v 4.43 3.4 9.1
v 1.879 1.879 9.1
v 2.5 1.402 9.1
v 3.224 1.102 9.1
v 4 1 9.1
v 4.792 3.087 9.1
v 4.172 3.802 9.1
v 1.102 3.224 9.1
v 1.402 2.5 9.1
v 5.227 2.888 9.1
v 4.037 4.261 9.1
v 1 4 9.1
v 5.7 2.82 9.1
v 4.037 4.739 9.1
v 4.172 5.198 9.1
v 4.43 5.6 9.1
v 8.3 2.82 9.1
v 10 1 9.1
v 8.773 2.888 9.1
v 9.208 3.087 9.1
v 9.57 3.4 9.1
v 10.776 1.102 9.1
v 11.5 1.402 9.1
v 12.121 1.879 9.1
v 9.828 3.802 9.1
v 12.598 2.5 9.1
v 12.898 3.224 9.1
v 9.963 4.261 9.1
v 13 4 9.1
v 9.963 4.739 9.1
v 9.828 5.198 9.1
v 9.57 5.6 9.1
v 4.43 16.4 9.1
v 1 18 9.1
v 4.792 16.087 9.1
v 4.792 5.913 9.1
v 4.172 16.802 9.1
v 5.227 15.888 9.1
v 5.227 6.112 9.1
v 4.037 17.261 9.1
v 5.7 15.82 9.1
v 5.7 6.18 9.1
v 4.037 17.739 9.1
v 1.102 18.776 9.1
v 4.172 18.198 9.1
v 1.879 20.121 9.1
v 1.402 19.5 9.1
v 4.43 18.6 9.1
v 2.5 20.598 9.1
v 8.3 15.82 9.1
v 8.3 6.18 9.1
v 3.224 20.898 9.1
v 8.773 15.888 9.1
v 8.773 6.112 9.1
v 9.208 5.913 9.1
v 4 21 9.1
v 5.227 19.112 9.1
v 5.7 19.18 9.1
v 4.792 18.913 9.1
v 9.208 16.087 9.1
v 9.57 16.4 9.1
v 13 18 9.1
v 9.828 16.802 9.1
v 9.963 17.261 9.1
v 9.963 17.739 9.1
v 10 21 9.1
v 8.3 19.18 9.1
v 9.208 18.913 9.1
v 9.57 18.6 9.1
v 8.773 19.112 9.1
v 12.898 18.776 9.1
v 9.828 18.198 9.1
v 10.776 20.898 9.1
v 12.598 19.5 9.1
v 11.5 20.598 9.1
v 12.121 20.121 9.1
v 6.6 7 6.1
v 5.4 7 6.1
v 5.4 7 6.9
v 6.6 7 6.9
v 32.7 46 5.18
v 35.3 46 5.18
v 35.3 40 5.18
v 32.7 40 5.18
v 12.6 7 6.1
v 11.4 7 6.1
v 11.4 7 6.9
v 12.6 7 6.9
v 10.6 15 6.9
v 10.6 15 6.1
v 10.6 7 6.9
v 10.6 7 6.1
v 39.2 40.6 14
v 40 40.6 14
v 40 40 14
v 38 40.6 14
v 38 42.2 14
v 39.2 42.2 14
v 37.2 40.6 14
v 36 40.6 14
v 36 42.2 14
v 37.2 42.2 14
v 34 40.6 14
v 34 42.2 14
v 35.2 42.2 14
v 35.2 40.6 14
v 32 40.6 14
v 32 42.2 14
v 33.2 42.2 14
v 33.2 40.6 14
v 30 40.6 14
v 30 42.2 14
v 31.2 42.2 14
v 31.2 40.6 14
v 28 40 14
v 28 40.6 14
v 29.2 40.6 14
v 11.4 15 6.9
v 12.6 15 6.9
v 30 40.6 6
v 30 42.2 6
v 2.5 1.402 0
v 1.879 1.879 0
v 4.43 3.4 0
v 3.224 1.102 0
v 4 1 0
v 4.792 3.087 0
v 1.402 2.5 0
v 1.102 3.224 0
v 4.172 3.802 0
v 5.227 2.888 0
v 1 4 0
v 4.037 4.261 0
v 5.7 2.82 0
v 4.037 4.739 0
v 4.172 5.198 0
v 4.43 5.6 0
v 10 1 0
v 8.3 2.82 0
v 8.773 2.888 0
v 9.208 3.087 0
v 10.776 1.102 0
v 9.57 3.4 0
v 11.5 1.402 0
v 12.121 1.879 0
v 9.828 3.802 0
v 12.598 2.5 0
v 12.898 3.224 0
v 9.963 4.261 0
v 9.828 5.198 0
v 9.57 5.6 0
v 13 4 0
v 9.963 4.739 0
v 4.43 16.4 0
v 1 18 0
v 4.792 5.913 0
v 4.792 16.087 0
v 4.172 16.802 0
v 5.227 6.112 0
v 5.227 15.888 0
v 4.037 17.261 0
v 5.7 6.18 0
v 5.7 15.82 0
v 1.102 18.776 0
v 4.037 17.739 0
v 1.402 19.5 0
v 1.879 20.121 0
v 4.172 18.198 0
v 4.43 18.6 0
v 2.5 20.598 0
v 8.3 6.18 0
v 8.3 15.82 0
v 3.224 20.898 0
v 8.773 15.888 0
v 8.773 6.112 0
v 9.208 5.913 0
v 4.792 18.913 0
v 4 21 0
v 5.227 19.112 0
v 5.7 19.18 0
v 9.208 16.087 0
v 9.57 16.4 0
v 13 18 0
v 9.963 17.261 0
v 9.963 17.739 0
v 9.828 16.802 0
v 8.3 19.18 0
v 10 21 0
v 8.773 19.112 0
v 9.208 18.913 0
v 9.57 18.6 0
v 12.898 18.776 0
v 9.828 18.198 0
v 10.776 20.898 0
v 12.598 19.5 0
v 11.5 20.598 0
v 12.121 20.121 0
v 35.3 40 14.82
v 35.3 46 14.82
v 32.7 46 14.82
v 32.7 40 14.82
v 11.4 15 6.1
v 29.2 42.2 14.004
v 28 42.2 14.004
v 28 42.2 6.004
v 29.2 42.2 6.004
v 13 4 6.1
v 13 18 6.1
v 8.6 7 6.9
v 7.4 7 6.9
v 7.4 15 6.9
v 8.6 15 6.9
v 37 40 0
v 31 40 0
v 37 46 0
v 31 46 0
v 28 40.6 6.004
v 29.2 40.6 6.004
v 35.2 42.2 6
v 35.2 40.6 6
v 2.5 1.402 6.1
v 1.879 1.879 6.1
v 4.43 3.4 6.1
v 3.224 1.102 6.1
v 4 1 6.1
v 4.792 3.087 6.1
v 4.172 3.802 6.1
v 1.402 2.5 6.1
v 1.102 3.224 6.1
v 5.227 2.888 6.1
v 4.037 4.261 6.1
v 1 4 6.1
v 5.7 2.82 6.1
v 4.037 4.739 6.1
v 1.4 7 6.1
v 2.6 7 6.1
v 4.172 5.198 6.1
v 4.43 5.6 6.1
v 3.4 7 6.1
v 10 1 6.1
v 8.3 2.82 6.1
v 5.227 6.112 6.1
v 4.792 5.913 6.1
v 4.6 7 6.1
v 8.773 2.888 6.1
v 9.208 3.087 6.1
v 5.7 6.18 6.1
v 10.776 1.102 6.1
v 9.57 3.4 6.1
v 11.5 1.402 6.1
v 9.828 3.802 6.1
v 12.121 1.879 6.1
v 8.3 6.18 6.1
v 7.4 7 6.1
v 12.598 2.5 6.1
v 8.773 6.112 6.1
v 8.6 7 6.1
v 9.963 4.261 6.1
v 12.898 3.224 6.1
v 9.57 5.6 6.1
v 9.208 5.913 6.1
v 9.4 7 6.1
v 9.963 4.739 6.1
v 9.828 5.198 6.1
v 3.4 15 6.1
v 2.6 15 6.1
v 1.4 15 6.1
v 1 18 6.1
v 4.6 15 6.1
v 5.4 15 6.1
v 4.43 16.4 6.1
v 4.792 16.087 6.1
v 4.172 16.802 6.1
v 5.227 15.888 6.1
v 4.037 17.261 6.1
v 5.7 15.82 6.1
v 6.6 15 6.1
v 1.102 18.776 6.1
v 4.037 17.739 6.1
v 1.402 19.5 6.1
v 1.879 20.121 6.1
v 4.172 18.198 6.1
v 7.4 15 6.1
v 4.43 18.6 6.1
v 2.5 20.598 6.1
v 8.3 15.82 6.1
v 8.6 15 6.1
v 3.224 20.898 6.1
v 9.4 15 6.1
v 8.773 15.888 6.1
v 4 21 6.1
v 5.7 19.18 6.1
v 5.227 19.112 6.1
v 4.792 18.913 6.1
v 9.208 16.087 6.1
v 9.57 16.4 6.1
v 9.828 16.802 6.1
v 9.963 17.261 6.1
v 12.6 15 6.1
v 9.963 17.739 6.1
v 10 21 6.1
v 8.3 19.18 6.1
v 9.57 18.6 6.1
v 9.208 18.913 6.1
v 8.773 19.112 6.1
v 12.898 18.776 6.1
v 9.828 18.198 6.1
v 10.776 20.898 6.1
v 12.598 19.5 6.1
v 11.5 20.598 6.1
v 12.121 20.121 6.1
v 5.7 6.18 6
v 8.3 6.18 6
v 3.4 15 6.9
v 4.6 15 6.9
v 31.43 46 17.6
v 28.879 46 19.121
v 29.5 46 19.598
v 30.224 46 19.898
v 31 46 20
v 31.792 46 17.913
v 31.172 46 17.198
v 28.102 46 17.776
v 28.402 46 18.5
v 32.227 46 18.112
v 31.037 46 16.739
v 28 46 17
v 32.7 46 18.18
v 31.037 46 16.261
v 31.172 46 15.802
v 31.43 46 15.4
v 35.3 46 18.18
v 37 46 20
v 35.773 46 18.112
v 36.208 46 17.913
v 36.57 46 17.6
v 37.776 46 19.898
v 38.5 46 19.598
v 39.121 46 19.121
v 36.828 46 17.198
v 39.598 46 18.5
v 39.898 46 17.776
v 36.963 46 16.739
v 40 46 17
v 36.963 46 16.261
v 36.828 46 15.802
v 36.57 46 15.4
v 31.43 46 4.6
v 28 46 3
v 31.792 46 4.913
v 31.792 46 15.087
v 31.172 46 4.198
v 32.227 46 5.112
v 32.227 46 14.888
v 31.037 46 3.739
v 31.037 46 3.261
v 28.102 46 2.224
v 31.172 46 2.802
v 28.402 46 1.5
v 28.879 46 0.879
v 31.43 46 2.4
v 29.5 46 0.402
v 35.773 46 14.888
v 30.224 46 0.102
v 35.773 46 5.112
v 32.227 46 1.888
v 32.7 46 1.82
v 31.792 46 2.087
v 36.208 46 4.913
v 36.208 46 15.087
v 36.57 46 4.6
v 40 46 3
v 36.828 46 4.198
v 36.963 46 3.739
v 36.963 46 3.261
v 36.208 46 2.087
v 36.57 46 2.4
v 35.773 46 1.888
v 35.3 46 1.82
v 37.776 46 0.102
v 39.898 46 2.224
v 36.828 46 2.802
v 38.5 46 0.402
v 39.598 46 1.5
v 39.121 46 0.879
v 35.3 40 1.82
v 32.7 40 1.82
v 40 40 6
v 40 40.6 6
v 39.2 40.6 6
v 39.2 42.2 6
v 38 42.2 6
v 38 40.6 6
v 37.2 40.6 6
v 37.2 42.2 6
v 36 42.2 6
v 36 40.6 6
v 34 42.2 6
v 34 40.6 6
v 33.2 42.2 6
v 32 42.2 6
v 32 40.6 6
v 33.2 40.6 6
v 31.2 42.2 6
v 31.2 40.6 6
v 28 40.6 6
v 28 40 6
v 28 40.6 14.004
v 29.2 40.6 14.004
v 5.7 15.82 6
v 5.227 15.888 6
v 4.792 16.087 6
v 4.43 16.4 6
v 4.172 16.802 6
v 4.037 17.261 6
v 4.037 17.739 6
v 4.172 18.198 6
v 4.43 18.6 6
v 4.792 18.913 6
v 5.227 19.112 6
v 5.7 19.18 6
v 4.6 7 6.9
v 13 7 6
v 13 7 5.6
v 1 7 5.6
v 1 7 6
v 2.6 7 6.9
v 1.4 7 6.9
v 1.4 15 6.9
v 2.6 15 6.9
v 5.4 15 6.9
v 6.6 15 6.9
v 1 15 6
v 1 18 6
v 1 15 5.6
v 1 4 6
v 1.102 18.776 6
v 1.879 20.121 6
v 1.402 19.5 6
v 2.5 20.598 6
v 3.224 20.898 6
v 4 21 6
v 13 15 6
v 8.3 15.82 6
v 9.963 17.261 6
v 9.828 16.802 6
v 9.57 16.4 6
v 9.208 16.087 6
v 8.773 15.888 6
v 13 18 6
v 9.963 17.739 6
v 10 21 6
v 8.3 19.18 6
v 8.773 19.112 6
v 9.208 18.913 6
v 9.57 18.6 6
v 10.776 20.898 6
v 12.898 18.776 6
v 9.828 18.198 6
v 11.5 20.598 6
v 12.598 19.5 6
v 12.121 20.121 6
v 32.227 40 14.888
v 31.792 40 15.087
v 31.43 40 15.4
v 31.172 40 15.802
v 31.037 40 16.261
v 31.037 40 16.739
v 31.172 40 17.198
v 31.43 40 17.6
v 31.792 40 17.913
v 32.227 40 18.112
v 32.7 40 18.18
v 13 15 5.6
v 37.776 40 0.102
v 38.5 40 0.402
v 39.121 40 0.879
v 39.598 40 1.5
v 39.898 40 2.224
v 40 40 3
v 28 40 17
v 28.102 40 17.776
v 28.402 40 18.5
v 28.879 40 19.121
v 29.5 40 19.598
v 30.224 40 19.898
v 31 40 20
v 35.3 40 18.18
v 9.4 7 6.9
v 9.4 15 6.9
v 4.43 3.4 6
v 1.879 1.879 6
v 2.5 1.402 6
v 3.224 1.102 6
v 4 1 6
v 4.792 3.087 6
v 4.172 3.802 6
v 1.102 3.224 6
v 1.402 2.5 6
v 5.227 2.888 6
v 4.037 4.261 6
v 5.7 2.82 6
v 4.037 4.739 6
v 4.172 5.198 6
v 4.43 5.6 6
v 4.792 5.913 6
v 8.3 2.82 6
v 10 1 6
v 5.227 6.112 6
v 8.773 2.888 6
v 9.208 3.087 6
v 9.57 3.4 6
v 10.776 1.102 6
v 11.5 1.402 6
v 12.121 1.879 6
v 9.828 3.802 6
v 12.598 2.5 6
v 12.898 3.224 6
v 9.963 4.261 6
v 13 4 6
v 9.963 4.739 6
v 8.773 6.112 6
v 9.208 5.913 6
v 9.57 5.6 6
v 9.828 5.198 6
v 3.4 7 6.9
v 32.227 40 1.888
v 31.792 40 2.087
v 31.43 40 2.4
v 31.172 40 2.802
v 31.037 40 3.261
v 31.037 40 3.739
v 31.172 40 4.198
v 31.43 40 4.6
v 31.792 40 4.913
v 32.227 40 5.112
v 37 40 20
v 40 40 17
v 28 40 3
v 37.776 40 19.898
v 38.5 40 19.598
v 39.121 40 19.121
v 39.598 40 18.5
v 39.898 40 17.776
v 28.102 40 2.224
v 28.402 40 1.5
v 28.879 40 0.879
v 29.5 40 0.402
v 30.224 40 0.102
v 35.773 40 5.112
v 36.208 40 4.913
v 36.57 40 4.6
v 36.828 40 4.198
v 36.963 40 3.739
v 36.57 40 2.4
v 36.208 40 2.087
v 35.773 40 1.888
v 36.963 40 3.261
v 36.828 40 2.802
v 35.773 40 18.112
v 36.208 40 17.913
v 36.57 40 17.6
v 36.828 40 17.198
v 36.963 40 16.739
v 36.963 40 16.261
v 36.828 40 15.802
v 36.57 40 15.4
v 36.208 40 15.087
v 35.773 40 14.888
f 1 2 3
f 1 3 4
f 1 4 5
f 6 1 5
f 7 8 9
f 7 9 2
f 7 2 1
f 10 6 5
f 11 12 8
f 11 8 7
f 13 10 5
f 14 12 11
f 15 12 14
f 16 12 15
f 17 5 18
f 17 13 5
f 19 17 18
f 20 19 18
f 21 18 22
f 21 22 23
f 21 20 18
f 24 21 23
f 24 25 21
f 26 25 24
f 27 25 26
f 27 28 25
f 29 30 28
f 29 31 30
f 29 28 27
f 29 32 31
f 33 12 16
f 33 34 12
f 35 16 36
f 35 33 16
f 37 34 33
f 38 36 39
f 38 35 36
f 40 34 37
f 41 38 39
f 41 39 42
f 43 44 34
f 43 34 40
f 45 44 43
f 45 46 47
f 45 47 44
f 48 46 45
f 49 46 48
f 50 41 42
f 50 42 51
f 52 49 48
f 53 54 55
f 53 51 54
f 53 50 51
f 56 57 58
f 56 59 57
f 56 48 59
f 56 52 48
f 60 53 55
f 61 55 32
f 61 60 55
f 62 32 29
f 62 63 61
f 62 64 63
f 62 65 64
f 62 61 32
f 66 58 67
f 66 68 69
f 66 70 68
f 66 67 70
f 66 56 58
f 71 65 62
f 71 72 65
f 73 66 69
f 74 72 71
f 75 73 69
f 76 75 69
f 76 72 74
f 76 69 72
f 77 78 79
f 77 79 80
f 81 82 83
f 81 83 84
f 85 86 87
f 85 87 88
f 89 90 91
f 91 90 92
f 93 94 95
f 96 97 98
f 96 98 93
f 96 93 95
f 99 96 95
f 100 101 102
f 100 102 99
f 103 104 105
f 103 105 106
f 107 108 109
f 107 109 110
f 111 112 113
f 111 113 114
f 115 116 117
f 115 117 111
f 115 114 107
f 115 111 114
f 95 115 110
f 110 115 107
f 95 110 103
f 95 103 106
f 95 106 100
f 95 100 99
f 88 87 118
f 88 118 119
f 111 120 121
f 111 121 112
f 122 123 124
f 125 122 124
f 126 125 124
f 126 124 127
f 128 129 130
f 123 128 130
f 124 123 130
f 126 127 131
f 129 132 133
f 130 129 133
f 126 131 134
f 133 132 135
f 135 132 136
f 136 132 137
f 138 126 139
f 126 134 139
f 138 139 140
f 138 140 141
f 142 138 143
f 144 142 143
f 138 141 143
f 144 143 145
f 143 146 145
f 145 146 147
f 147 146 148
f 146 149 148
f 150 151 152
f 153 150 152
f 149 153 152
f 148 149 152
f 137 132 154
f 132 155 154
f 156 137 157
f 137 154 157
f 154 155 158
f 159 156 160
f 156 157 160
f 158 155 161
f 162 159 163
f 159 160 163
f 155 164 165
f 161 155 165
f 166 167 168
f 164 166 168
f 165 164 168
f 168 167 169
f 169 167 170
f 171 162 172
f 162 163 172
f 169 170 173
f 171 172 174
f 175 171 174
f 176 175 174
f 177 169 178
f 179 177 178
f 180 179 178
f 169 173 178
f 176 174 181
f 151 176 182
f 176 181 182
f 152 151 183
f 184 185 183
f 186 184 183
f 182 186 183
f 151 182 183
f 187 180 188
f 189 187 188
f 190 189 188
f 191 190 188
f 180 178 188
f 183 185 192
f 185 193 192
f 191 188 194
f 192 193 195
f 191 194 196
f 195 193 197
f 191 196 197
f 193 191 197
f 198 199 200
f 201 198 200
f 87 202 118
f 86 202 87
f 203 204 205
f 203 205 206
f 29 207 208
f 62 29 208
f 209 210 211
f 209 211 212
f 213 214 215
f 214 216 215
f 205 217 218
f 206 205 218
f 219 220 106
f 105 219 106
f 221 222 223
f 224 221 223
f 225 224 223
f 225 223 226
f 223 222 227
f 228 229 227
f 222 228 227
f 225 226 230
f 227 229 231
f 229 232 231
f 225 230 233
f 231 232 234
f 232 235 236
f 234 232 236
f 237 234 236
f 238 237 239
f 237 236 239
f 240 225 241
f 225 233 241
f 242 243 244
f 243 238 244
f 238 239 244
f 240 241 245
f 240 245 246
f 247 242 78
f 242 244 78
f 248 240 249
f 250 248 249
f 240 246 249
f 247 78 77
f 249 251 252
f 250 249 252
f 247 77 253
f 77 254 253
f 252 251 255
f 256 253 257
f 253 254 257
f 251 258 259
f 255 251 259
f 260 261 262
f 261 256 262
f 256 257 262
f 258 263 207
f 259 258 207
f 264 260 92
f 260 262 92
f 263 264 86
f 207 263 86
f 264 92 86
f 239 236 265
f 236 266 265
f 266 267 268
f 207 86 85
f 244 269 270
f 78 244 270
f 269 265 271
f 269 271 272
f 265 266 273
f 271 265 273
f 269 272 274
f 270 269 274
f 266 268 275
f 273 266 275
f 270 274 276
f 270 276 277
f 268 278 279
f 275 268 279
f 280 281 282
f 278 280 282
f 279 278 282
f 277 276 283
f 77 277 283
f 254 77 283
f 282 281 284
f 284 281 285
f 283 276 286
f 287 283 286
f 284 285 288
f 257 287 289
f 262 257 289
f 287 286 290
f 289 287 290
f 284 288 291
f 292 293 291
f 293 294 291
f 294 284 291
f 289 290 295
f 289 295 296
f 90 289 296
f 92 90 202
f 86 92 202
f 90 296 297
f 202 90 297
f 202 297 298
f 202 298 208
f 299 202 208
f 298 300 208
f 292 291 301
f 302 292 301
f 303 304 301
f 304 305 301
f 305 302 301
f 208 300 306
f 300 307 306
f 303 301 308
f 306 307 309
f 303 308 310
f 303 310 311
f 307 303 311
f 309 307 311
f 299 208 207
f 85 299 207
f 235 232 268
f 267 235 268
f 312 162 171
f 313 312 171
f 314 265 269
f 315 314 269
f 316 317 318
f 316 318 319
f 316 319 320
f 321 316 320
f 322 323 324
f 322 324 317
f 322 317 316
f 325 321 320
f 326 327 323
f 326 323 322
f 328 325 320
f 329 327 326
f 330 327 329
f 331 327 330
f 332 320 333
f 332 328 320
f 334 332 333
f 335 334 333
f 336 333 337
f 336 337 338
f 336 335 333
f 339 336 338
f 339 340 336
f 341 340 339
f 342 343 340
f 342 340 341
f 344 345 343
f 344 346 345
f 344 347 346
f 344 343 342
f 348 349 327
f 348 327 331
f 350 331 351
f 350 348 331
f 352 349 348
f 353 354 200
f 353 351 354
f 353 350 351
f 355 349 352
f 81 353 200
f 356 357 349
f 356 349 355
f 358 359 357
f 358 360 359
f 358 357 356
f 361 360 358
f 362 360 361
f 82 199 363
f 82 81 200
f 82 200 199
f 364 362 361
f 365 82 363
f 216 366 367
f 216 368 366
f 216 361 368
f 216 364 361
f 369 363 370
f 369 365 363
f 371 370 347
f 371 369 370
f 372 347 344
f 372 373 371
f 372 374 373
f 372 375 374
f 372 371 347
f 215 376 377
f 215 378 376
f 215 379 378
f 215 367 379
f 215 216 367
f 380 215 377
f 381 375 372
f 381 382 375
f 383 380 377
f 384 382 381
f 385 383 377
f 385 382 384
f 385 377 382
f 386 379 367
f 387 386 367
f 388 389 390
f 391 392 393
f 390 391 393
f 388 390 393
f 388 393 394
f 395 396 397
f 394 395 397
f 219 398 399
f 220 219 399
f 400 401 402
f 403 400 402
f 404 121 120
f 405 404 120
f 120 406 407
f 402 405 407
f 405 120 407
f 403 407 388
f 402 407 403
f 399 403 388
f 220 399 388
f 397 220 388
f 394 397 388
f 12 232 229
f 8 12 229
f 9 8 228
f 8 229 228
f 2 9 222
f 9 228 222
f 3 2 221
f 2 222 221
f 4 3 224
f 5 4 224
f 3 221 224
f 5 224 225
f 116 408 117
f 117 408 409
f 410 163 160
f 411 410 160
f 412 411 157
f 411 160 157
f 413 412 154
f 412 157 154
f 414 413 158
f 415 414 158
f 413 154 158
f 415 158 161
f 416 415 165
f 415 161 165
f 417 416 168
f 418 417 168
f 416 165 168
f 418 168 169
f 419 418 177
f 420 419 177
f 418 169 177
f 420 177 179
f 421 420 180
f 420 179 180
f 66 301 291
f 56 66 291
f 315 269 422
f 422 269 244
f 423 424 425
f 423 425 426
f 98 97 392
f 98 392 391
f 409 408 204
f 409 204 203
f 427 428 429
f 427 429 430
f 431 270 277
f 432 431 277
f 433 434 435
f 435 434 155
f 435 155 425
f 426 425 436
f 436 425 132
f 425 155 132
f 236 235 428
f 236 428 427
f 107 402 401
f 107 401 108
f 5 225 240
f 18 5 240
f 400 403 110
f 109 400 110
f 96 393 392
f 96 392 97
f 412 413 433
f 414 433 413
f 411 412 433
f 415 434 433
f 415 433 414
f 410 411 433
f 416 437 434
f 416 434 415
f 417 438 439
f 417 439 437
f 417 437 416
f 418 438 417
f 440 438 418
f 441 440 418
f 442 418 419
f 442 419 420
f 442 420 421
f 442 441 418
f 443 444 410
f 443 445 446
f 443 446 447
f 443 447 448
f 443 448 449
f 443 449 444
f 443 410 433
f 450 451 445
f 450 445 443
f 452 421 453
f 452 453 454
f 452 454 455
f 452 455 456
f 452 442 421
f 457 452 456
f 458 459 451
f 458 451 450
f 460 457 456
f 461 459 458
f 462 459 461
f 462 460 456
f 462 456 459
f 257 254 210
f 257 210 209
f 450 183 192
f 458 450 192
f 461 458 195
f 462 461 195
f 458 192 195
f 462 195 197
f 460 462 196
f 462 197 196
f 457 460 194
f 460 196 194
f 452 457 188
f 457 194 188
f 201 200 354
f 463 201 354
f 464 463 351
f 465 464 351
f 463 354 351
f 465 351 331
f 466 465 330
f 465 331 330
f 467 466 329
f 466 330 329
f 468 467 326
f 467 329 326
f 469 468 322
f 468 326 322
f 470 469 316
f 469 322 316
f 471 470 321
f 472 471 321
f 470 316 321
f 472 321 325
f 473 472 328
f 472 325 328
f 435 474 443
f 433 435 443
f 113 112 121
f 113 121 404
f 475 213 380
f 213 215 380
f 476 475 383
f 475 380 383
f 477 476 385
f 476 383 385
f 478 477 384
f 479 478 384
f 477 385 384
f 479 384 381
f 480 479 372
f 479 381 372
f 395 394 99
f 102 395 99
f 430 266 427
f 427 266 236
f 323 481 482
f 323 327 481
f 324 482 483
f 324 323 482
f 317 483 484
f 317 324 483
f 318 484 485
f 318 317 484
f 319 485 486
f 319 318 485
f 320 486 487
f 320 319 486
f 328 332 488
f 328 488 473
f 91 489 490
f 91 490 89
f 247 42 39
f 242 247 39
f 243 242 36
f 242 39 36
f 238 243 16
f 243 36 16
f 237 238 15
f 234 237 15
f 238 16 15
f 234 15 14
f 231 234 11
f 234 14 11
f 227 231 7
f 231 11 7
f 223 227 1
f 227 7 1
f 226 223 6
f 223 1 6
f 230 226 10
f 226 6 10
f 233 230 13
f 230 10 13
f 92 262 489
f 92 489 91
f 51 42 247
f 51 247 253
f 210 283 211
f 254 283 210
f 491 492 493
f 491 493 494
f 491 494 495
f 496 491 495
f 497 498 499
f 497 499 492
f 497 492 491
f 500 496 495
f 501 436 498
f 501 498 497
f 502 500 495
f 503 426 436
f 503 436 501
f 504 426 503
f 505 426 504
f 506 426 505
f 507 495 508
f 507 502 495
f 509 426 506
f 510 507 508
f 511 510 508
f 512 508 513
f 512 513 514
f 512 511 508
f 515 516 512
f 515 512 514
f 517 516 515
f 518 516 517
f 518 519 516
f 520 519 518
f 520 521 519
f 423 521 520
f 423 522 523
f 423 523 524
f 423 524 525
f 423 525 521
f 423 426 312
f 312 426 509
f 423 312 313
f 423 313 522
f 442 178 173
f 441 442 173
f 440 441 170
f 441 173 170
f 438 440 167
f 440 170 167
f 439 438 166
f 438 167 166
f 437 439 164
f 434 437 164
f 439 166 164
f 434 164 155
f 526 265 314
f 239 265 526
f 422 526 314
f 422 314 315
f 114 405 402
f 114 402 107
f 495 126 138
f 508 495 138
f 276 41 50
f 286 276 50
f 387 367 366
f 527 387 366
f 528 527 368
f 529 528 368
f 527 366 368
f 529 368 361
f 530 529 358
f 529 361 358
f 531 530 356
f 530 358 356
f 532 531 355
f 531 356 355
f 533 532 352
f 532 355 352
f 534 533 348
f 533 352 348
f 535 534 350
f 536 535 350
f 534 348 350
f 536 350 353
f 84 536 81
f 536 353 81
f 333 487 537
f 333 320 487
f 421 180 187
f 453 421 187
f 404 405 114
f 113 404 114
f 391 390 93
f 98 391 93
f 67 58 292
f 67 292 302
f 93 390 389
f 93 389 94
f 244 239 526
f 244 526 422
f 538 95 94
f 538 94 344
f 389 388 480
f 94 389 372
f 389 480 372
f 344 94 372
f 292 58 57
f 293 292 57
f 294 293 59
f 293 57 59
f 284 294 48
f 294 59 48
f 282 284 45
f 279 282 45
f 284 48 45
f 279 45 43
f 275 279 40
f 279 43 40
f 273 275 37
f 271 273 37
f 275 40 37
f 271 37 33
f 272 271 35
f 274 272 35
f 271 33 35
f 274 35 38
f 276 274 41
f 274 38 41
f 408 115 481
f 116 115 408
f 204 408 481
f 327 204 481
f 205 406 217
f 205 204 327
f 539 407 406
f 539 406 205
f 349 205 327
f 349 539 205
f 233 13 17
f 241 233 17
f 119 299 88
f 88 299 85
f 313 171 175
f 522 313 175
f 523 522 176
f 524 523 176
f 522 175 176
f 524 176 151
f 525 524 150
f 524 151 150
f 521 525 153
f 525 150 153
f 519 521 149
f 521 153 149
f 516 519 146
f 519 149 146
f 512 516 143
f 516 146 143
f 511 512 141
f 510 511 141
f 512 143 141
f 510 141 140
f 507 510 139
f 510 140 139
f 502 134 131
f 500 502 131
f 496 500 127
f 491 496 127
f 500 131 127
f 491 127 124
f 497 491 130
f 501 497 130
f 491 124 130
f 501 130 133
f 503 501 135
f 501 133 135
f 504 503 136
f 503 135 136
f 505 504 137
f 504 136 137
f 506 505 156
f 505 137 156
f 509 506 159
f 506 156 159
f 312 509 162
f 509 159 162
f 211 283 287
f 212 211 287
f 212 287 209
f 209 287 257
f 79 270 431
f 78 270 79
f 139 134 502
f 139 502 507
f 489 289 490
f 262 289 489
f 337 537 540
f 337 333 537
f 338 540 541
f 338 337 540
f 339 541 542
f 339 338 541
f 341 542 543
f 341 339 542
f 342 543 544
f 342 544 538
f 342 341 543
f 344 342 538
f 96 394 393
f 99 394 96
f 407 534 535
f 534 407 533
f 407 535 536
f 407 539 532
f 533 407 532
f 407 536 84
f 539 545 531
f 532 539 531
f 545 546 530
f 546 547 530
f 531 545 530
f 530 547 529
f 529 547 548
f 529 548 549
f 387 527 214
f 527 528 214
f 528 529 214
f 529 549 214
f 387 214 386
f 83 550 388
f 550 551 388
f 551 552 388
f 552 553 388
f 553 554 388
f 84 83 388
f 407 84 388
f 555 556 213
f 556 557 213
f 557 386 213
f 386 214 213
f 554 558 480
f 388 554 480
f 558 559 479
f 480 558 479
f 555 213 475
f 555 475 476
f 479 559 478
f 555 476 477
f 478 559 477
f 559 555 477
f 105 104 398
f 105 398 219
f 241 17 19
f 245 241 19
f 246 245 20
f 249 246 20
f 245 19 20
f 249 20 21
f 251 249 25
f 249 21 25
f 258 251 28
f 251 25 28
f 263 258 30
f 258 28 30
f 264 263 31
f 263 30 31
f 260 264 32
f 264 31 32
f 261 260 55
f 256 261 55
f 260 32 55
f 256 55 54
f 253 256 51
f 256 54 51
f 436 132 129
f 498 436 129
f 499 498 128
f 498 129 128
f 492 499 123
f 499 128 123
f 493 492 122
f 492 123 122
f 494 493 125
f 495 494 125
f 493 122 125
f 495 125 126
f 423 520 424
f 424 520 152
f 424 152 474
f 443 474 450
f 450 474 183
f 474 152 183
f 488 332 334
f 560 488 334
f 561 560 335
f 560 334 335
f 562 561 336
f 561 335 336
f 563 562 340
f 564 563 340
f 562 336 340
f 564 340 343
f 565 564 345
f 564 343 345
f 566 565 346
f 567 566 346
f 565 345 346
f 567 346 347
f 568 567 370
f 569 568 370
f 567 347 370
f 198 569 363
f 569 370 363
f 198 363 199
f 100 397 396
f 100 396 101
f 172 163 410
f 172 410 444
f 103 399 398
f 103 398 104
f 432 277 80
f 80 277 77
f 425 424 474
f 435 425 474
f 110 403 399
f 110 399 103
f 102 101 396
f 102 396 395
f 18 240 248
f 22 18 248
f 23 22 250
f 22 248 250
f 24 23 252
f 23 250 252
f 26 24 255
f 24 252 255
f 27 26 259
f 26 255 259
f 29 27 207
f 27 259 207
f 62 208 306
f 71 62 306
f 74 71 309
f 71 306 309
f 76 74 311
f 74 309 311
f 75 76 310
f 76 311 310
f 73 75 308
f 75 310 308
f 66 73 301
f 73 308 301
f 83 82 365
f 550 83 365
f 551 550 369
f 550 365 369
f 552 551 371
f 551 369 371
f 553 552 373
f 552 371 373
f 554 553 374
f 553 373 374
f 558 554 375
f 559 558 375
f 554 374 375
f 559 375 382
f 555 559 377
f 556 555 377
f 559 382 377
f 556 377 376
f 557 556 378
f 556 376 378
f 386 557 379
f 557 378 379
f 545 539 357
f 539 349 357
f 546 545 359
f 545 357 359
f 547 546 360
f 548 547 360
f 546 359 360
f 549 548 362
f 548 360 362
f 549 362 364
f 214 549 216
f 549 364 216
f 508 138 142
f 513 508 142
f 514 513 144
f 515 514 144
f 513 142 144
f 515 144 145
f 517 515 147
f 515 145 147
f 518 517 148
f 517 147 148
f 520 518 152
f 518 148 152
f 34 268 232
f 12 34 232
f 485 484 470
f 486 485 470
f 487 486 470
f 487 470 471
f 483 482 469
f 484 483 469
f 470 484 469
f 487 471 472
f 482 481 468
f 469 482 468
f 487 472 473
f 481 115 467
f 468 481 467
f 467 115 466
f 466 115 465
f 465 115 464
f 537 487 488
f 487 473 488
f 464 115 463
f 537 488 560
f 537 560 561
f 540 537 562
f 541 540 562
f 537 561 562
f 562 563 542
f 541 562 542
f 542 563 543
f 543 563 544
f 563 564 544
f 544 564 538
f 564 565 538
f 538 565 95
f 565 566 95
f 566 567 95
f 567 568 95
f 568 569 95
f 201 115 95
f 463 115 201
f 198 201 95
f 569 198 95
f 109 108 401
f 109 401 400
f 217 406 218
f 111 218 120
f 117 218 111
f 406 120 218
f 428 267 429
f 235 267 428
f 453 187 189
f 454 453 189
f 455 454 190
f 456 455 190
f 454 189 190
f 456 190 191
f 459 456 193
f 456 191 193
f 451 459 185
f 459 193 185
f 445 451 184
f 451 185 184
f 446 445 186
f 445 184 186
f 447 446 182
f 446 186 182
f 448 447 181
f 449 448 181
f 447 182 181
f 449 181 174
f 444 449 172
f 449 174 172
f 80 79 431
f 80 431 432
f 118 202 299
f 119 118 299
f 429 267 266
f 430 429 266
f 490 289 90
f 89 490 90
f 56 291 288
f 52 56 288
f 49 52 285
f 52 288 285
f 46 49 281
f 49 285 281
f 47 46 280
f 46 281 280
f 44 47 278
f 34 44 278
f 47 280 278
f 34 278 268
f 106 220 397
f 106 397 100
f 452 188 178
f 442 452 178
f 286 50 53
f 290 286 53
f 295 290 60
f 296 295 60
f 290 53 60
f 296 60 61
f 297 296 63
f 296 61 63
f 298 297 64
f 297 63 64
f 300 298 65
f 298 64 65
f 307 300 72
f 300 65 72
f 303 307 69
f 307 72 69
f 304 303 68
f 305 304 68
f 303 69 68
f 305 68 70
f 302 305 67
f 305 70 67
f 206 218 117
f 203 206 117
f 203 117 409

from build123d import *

# Parameters (mm, degrees)
BOX002_W        = 12
BOX002_H        = 6
BOX002_DEPTH    = 20
POCKET015_DEPTH = 6.001
SKETCH013_W     = 0.6
SKETCH013_H     = 8
POCKET016_DEPTH = 12.001
SKETCH011_W     = 1.2
SKETCH011_H     = 8
POCKET017_DEPTH = 1.6
FILLET006_R     = 3
PAD_DEPTH       = 6
SKETCH015_W     = 8
SKETCH015_H     = 0.5
POCKET_DEPTH    = 12.001
POCKET018_DEPTH = 6.001
PAD001_DEPTH    = 3
POCKET019_DEPTH = 5
SKETCH017_W     = 1.2
SKETCH017_H     = 8
POCKET020_DEPTH = 0.8


with BuildPart() as fillet006:
    # Box002 → Box002 (new body)
    with BuildSketch(Plane(origin=(28, 40, 0), x_dir=(1, 0, 0), z_dir=(0, 0, 1))):
        with Locations((6, 3)):
            Rectangle(BOX002_W, BOX002_H)
    extrude(amount=BOX002_DEPTH)

    # Sketch012 → Pocket015 (cut, through all)
    with BuildSketch(Plane(origin=(28, 46, 0), x_dir=(-1, 0, 0), z_dir=(0, 1, 0))):
        with BuildLine():
            ThreePointArc((-7.3, 18.18), (-8.98, 16.5), (-7.3, 14.82))
            Line((-7.3, 14.82), (-4.7, 14.82))
            ThreePointArc((-4.7, 14.82), (-3.02, 16.5), (-4.7, 18.18))
            Line((-7.3, 18.18), (-4.7, 18.18))
        make_face()
        with BuildLine():
            ThreePointArc((-7.3, 5.18), (-8.98, 3.5), (-7.3, 1.82))
            Line((-7.3, 1.82), (-4.7, 1.82))
            ThreePointArc((-4.7, 1.82), (-3.02, 3.5), (-4.7, 5.18))
            Line((-7.3, 5.18), (-4.7, 5.18))
        make_face()
    extrude(amount=-POCKET015_DEPTH, mode=Mode.SUBTRACT)

    # Sketch013 → Pocket016 (cut, through all)
    with BuildSketch(Plane(origin=(28, 40, 0), x_dir=(0, -1, 0), z_dir=(-1, 0, 0))):
        with Locations((-0.3, 10)):
            Rectangle(SKETCH013_W, SKETCH013_H)
    extrude(amount=-POCKET016_DEPTH, mode=Mode.SUBTRACT)

    # Sketch011 → Pocket017 (cut)
    with BuildSketch(Plane(origin=(28, 40.6, 0), x_dir=(1, 0, 0), z_dir=(0, -1, 0))):
        with Locations((6.599989, 10)):
            Rectangle(SKETCH011_W, SKETCH011_H)
        with Locations((4.599989, 10)):
            Rectangle(SKETCH011_W, SKETCH011_H)
        with Locations((2.599989, 10)):
            Rectangle(SKETCH011_W, SKETCH011_H)
        with Locations((0.6, 10.00427)):
            Rectangle(SKETCH011_W, SKETCH011_H)
        with Locations((8.599989, 10)):
            Rectangle(SKETCH011_W, SKETCH011_H)
        with Locations((10.599989, 10)):
            Rectangle(SKETCH011_W, SKETCH011_H)
    extrude(amount=-POCKET017_DEPTH, mode=Mode.SUBTRACT)

    # Fillet006
    fillet006_edges = [fillet006.edges().sort_by_distance(p)[0] for p in [
        (28, 43, 20),
        (28, 43, 0),
        (40, 43, 20),
        (40, 43, 0),
    ]]
    fillet(fillet006_edges, radius=FILLET006_R)


with BuildPart() as pocket018:
    # Sketch → Pad (new body)
    with BuildSketch(Plane.XY):
        with BuildLine():
            Line((4, 1), (10, 1))
            ThreePointArc((10, 1), (12.12132, 1.87868), (13, 4))
            Line((13, 4), (13, 18))
            ThreePointArc((13, 18), (12.12132, 20.12132), (10, 21))
            Line((10, 21), (4, 21))
            ThreePointArc((4, 21), (1.87868, 20.12132), (1, 18))
            Line((1, 18), (1, 4))
            ThreePointArc((1, 4), (1.87868, 1.87868), (4, 1))
        make_face()
    extrude(amount=PAD_DEPTH)

    # Sketch015 → Pocket (cut, through all)
    with BuildSketch(Plane.YZ.offset(13)):
        with Locations((11, 5.85)):
            Rectangle(SKETCH015_W, SKETCH015_H)
    extrude(amount=-POCKET_DEPTH, mode=Mode.SUBTRACT)

    # Sketch016 → Pocket018 (cut, through all)
    with BuildSketch(Plane(origin=(0, 0, 0), x_dir=(1, 0, 0), z_dir=(0, 0, -1))):
        with BuildLine():
            ThreePointArc((5.7, -15.82), (4.02, -17.5), (5.7, -19.18))
            Line((5.7, -19.18), (8.3, -19.18))
            ThreePointArc((8.3, -19.18), (9.98, -17.5), (8.3, -15.82))
            Line((5.7, -15.82), (8.3, -15.82))
        make_face()
        with BuildLine():
            ThreePointArc((5.7, -2.82), (4.02, -4.5), (5.7, -6.18))
            Line((5.7, -6.18), (8.3, -6.18))
            ThreePointArc((8.3, -6.18), (9.98, -4.5), (8.3, -2.82))
            Line((5.7, -2.82), (8.3, -2.82))
        make_face()
    extrude(amount=-POCKET018_DEPTH, mode=Mode.SUBTRACT)


with BuildPart() as pocket020:
    # Sketch014 → Pad001 (new body)
    with BuildSketch(Plane.XY.offset(6.1)):
        with BuildLine():
            Line((4, 1), (10, 1))
            ThreePointArc((10, 1), (12.12132, 1.87868), (13, 4))
            Line((13, 4), (13, 18))
            ThreePointArc((13, 18), (12.12132, 20.12132), (10, 21))
            Line((10, 21), (4, 21))
            ThreePointArc((4, 21), (1.87868, 20.12132), (1, 18))
            Line((1, 18), (1, 4))
            ThreePointArc((1, 4), (1.87868, 1.87868), (4, 1))
        make_face()
    extrude(amount=PAD001_DEPTH)

    # Sketch018 → Pocket019 (cut)
    with BuildSketch(Plane.XY.offset(9.1)):
        with BuildLine():
            ThreePointArc((5.7, 6.18), (4.02, 4.5), (5.7, 2.82))
            Line((5.7, 2.82), (8.3, 2.82))
            ThreePointArc((8.3, 2.82), (9.98, 4.5), (8.3, 6.18))
            Line((5.7, 6.18), (8.3, 6.18))
        make_face()
        with BuildLine():
            ThreePointArc((5.7, 19.18), (4.02, 17.5), (5.7, 15.82))
            Line((5.7, 15.82), (8.3, 15.82))
            ThreePointArc((8.3, 15.82), (9.98, 17.5), (8.3, 19.18))
            Line((5.7, 19.18), (8.3, 19.18))
        make_face()
    extrude(amount=-POCKET019_DEPTH, mode=Mode.SUBTRACT)

    # Sketch017 → Pocket020 (cut)
    with BuildSketch(Plane(origin=(0, 0, 6.1), x_dir=(1, 0, 0), z_dir=(0, 0, -1))):
        with Locations((8, -11)):
            Rectangle(SKETCH017_W, SKETCH017_H)
        with Locations((6, -11)):
            Rectangle(SKETCH017_W, SKETCH017_H)
        with Locations((4, -11)):
            Rectangle(SKETCH017_W, SKETCH017_H)
        with Locations((2, -11)):
            Rectangle(SKETCH017_W, SKETCH017_H)
        with Locations((10, -11)):
            Rectangle(SKETCH017_W, SKETCH017_H)
        with Locations((12, -11)):
            Rectangle(SKETCH017_W, SKETCH017_H)
    extrude(amount=-POCKET020_DEPTH, mode=Mode.SUBTRACT)


solid = Compound([fillet006.part, pocket018.part, pocket020.part])
